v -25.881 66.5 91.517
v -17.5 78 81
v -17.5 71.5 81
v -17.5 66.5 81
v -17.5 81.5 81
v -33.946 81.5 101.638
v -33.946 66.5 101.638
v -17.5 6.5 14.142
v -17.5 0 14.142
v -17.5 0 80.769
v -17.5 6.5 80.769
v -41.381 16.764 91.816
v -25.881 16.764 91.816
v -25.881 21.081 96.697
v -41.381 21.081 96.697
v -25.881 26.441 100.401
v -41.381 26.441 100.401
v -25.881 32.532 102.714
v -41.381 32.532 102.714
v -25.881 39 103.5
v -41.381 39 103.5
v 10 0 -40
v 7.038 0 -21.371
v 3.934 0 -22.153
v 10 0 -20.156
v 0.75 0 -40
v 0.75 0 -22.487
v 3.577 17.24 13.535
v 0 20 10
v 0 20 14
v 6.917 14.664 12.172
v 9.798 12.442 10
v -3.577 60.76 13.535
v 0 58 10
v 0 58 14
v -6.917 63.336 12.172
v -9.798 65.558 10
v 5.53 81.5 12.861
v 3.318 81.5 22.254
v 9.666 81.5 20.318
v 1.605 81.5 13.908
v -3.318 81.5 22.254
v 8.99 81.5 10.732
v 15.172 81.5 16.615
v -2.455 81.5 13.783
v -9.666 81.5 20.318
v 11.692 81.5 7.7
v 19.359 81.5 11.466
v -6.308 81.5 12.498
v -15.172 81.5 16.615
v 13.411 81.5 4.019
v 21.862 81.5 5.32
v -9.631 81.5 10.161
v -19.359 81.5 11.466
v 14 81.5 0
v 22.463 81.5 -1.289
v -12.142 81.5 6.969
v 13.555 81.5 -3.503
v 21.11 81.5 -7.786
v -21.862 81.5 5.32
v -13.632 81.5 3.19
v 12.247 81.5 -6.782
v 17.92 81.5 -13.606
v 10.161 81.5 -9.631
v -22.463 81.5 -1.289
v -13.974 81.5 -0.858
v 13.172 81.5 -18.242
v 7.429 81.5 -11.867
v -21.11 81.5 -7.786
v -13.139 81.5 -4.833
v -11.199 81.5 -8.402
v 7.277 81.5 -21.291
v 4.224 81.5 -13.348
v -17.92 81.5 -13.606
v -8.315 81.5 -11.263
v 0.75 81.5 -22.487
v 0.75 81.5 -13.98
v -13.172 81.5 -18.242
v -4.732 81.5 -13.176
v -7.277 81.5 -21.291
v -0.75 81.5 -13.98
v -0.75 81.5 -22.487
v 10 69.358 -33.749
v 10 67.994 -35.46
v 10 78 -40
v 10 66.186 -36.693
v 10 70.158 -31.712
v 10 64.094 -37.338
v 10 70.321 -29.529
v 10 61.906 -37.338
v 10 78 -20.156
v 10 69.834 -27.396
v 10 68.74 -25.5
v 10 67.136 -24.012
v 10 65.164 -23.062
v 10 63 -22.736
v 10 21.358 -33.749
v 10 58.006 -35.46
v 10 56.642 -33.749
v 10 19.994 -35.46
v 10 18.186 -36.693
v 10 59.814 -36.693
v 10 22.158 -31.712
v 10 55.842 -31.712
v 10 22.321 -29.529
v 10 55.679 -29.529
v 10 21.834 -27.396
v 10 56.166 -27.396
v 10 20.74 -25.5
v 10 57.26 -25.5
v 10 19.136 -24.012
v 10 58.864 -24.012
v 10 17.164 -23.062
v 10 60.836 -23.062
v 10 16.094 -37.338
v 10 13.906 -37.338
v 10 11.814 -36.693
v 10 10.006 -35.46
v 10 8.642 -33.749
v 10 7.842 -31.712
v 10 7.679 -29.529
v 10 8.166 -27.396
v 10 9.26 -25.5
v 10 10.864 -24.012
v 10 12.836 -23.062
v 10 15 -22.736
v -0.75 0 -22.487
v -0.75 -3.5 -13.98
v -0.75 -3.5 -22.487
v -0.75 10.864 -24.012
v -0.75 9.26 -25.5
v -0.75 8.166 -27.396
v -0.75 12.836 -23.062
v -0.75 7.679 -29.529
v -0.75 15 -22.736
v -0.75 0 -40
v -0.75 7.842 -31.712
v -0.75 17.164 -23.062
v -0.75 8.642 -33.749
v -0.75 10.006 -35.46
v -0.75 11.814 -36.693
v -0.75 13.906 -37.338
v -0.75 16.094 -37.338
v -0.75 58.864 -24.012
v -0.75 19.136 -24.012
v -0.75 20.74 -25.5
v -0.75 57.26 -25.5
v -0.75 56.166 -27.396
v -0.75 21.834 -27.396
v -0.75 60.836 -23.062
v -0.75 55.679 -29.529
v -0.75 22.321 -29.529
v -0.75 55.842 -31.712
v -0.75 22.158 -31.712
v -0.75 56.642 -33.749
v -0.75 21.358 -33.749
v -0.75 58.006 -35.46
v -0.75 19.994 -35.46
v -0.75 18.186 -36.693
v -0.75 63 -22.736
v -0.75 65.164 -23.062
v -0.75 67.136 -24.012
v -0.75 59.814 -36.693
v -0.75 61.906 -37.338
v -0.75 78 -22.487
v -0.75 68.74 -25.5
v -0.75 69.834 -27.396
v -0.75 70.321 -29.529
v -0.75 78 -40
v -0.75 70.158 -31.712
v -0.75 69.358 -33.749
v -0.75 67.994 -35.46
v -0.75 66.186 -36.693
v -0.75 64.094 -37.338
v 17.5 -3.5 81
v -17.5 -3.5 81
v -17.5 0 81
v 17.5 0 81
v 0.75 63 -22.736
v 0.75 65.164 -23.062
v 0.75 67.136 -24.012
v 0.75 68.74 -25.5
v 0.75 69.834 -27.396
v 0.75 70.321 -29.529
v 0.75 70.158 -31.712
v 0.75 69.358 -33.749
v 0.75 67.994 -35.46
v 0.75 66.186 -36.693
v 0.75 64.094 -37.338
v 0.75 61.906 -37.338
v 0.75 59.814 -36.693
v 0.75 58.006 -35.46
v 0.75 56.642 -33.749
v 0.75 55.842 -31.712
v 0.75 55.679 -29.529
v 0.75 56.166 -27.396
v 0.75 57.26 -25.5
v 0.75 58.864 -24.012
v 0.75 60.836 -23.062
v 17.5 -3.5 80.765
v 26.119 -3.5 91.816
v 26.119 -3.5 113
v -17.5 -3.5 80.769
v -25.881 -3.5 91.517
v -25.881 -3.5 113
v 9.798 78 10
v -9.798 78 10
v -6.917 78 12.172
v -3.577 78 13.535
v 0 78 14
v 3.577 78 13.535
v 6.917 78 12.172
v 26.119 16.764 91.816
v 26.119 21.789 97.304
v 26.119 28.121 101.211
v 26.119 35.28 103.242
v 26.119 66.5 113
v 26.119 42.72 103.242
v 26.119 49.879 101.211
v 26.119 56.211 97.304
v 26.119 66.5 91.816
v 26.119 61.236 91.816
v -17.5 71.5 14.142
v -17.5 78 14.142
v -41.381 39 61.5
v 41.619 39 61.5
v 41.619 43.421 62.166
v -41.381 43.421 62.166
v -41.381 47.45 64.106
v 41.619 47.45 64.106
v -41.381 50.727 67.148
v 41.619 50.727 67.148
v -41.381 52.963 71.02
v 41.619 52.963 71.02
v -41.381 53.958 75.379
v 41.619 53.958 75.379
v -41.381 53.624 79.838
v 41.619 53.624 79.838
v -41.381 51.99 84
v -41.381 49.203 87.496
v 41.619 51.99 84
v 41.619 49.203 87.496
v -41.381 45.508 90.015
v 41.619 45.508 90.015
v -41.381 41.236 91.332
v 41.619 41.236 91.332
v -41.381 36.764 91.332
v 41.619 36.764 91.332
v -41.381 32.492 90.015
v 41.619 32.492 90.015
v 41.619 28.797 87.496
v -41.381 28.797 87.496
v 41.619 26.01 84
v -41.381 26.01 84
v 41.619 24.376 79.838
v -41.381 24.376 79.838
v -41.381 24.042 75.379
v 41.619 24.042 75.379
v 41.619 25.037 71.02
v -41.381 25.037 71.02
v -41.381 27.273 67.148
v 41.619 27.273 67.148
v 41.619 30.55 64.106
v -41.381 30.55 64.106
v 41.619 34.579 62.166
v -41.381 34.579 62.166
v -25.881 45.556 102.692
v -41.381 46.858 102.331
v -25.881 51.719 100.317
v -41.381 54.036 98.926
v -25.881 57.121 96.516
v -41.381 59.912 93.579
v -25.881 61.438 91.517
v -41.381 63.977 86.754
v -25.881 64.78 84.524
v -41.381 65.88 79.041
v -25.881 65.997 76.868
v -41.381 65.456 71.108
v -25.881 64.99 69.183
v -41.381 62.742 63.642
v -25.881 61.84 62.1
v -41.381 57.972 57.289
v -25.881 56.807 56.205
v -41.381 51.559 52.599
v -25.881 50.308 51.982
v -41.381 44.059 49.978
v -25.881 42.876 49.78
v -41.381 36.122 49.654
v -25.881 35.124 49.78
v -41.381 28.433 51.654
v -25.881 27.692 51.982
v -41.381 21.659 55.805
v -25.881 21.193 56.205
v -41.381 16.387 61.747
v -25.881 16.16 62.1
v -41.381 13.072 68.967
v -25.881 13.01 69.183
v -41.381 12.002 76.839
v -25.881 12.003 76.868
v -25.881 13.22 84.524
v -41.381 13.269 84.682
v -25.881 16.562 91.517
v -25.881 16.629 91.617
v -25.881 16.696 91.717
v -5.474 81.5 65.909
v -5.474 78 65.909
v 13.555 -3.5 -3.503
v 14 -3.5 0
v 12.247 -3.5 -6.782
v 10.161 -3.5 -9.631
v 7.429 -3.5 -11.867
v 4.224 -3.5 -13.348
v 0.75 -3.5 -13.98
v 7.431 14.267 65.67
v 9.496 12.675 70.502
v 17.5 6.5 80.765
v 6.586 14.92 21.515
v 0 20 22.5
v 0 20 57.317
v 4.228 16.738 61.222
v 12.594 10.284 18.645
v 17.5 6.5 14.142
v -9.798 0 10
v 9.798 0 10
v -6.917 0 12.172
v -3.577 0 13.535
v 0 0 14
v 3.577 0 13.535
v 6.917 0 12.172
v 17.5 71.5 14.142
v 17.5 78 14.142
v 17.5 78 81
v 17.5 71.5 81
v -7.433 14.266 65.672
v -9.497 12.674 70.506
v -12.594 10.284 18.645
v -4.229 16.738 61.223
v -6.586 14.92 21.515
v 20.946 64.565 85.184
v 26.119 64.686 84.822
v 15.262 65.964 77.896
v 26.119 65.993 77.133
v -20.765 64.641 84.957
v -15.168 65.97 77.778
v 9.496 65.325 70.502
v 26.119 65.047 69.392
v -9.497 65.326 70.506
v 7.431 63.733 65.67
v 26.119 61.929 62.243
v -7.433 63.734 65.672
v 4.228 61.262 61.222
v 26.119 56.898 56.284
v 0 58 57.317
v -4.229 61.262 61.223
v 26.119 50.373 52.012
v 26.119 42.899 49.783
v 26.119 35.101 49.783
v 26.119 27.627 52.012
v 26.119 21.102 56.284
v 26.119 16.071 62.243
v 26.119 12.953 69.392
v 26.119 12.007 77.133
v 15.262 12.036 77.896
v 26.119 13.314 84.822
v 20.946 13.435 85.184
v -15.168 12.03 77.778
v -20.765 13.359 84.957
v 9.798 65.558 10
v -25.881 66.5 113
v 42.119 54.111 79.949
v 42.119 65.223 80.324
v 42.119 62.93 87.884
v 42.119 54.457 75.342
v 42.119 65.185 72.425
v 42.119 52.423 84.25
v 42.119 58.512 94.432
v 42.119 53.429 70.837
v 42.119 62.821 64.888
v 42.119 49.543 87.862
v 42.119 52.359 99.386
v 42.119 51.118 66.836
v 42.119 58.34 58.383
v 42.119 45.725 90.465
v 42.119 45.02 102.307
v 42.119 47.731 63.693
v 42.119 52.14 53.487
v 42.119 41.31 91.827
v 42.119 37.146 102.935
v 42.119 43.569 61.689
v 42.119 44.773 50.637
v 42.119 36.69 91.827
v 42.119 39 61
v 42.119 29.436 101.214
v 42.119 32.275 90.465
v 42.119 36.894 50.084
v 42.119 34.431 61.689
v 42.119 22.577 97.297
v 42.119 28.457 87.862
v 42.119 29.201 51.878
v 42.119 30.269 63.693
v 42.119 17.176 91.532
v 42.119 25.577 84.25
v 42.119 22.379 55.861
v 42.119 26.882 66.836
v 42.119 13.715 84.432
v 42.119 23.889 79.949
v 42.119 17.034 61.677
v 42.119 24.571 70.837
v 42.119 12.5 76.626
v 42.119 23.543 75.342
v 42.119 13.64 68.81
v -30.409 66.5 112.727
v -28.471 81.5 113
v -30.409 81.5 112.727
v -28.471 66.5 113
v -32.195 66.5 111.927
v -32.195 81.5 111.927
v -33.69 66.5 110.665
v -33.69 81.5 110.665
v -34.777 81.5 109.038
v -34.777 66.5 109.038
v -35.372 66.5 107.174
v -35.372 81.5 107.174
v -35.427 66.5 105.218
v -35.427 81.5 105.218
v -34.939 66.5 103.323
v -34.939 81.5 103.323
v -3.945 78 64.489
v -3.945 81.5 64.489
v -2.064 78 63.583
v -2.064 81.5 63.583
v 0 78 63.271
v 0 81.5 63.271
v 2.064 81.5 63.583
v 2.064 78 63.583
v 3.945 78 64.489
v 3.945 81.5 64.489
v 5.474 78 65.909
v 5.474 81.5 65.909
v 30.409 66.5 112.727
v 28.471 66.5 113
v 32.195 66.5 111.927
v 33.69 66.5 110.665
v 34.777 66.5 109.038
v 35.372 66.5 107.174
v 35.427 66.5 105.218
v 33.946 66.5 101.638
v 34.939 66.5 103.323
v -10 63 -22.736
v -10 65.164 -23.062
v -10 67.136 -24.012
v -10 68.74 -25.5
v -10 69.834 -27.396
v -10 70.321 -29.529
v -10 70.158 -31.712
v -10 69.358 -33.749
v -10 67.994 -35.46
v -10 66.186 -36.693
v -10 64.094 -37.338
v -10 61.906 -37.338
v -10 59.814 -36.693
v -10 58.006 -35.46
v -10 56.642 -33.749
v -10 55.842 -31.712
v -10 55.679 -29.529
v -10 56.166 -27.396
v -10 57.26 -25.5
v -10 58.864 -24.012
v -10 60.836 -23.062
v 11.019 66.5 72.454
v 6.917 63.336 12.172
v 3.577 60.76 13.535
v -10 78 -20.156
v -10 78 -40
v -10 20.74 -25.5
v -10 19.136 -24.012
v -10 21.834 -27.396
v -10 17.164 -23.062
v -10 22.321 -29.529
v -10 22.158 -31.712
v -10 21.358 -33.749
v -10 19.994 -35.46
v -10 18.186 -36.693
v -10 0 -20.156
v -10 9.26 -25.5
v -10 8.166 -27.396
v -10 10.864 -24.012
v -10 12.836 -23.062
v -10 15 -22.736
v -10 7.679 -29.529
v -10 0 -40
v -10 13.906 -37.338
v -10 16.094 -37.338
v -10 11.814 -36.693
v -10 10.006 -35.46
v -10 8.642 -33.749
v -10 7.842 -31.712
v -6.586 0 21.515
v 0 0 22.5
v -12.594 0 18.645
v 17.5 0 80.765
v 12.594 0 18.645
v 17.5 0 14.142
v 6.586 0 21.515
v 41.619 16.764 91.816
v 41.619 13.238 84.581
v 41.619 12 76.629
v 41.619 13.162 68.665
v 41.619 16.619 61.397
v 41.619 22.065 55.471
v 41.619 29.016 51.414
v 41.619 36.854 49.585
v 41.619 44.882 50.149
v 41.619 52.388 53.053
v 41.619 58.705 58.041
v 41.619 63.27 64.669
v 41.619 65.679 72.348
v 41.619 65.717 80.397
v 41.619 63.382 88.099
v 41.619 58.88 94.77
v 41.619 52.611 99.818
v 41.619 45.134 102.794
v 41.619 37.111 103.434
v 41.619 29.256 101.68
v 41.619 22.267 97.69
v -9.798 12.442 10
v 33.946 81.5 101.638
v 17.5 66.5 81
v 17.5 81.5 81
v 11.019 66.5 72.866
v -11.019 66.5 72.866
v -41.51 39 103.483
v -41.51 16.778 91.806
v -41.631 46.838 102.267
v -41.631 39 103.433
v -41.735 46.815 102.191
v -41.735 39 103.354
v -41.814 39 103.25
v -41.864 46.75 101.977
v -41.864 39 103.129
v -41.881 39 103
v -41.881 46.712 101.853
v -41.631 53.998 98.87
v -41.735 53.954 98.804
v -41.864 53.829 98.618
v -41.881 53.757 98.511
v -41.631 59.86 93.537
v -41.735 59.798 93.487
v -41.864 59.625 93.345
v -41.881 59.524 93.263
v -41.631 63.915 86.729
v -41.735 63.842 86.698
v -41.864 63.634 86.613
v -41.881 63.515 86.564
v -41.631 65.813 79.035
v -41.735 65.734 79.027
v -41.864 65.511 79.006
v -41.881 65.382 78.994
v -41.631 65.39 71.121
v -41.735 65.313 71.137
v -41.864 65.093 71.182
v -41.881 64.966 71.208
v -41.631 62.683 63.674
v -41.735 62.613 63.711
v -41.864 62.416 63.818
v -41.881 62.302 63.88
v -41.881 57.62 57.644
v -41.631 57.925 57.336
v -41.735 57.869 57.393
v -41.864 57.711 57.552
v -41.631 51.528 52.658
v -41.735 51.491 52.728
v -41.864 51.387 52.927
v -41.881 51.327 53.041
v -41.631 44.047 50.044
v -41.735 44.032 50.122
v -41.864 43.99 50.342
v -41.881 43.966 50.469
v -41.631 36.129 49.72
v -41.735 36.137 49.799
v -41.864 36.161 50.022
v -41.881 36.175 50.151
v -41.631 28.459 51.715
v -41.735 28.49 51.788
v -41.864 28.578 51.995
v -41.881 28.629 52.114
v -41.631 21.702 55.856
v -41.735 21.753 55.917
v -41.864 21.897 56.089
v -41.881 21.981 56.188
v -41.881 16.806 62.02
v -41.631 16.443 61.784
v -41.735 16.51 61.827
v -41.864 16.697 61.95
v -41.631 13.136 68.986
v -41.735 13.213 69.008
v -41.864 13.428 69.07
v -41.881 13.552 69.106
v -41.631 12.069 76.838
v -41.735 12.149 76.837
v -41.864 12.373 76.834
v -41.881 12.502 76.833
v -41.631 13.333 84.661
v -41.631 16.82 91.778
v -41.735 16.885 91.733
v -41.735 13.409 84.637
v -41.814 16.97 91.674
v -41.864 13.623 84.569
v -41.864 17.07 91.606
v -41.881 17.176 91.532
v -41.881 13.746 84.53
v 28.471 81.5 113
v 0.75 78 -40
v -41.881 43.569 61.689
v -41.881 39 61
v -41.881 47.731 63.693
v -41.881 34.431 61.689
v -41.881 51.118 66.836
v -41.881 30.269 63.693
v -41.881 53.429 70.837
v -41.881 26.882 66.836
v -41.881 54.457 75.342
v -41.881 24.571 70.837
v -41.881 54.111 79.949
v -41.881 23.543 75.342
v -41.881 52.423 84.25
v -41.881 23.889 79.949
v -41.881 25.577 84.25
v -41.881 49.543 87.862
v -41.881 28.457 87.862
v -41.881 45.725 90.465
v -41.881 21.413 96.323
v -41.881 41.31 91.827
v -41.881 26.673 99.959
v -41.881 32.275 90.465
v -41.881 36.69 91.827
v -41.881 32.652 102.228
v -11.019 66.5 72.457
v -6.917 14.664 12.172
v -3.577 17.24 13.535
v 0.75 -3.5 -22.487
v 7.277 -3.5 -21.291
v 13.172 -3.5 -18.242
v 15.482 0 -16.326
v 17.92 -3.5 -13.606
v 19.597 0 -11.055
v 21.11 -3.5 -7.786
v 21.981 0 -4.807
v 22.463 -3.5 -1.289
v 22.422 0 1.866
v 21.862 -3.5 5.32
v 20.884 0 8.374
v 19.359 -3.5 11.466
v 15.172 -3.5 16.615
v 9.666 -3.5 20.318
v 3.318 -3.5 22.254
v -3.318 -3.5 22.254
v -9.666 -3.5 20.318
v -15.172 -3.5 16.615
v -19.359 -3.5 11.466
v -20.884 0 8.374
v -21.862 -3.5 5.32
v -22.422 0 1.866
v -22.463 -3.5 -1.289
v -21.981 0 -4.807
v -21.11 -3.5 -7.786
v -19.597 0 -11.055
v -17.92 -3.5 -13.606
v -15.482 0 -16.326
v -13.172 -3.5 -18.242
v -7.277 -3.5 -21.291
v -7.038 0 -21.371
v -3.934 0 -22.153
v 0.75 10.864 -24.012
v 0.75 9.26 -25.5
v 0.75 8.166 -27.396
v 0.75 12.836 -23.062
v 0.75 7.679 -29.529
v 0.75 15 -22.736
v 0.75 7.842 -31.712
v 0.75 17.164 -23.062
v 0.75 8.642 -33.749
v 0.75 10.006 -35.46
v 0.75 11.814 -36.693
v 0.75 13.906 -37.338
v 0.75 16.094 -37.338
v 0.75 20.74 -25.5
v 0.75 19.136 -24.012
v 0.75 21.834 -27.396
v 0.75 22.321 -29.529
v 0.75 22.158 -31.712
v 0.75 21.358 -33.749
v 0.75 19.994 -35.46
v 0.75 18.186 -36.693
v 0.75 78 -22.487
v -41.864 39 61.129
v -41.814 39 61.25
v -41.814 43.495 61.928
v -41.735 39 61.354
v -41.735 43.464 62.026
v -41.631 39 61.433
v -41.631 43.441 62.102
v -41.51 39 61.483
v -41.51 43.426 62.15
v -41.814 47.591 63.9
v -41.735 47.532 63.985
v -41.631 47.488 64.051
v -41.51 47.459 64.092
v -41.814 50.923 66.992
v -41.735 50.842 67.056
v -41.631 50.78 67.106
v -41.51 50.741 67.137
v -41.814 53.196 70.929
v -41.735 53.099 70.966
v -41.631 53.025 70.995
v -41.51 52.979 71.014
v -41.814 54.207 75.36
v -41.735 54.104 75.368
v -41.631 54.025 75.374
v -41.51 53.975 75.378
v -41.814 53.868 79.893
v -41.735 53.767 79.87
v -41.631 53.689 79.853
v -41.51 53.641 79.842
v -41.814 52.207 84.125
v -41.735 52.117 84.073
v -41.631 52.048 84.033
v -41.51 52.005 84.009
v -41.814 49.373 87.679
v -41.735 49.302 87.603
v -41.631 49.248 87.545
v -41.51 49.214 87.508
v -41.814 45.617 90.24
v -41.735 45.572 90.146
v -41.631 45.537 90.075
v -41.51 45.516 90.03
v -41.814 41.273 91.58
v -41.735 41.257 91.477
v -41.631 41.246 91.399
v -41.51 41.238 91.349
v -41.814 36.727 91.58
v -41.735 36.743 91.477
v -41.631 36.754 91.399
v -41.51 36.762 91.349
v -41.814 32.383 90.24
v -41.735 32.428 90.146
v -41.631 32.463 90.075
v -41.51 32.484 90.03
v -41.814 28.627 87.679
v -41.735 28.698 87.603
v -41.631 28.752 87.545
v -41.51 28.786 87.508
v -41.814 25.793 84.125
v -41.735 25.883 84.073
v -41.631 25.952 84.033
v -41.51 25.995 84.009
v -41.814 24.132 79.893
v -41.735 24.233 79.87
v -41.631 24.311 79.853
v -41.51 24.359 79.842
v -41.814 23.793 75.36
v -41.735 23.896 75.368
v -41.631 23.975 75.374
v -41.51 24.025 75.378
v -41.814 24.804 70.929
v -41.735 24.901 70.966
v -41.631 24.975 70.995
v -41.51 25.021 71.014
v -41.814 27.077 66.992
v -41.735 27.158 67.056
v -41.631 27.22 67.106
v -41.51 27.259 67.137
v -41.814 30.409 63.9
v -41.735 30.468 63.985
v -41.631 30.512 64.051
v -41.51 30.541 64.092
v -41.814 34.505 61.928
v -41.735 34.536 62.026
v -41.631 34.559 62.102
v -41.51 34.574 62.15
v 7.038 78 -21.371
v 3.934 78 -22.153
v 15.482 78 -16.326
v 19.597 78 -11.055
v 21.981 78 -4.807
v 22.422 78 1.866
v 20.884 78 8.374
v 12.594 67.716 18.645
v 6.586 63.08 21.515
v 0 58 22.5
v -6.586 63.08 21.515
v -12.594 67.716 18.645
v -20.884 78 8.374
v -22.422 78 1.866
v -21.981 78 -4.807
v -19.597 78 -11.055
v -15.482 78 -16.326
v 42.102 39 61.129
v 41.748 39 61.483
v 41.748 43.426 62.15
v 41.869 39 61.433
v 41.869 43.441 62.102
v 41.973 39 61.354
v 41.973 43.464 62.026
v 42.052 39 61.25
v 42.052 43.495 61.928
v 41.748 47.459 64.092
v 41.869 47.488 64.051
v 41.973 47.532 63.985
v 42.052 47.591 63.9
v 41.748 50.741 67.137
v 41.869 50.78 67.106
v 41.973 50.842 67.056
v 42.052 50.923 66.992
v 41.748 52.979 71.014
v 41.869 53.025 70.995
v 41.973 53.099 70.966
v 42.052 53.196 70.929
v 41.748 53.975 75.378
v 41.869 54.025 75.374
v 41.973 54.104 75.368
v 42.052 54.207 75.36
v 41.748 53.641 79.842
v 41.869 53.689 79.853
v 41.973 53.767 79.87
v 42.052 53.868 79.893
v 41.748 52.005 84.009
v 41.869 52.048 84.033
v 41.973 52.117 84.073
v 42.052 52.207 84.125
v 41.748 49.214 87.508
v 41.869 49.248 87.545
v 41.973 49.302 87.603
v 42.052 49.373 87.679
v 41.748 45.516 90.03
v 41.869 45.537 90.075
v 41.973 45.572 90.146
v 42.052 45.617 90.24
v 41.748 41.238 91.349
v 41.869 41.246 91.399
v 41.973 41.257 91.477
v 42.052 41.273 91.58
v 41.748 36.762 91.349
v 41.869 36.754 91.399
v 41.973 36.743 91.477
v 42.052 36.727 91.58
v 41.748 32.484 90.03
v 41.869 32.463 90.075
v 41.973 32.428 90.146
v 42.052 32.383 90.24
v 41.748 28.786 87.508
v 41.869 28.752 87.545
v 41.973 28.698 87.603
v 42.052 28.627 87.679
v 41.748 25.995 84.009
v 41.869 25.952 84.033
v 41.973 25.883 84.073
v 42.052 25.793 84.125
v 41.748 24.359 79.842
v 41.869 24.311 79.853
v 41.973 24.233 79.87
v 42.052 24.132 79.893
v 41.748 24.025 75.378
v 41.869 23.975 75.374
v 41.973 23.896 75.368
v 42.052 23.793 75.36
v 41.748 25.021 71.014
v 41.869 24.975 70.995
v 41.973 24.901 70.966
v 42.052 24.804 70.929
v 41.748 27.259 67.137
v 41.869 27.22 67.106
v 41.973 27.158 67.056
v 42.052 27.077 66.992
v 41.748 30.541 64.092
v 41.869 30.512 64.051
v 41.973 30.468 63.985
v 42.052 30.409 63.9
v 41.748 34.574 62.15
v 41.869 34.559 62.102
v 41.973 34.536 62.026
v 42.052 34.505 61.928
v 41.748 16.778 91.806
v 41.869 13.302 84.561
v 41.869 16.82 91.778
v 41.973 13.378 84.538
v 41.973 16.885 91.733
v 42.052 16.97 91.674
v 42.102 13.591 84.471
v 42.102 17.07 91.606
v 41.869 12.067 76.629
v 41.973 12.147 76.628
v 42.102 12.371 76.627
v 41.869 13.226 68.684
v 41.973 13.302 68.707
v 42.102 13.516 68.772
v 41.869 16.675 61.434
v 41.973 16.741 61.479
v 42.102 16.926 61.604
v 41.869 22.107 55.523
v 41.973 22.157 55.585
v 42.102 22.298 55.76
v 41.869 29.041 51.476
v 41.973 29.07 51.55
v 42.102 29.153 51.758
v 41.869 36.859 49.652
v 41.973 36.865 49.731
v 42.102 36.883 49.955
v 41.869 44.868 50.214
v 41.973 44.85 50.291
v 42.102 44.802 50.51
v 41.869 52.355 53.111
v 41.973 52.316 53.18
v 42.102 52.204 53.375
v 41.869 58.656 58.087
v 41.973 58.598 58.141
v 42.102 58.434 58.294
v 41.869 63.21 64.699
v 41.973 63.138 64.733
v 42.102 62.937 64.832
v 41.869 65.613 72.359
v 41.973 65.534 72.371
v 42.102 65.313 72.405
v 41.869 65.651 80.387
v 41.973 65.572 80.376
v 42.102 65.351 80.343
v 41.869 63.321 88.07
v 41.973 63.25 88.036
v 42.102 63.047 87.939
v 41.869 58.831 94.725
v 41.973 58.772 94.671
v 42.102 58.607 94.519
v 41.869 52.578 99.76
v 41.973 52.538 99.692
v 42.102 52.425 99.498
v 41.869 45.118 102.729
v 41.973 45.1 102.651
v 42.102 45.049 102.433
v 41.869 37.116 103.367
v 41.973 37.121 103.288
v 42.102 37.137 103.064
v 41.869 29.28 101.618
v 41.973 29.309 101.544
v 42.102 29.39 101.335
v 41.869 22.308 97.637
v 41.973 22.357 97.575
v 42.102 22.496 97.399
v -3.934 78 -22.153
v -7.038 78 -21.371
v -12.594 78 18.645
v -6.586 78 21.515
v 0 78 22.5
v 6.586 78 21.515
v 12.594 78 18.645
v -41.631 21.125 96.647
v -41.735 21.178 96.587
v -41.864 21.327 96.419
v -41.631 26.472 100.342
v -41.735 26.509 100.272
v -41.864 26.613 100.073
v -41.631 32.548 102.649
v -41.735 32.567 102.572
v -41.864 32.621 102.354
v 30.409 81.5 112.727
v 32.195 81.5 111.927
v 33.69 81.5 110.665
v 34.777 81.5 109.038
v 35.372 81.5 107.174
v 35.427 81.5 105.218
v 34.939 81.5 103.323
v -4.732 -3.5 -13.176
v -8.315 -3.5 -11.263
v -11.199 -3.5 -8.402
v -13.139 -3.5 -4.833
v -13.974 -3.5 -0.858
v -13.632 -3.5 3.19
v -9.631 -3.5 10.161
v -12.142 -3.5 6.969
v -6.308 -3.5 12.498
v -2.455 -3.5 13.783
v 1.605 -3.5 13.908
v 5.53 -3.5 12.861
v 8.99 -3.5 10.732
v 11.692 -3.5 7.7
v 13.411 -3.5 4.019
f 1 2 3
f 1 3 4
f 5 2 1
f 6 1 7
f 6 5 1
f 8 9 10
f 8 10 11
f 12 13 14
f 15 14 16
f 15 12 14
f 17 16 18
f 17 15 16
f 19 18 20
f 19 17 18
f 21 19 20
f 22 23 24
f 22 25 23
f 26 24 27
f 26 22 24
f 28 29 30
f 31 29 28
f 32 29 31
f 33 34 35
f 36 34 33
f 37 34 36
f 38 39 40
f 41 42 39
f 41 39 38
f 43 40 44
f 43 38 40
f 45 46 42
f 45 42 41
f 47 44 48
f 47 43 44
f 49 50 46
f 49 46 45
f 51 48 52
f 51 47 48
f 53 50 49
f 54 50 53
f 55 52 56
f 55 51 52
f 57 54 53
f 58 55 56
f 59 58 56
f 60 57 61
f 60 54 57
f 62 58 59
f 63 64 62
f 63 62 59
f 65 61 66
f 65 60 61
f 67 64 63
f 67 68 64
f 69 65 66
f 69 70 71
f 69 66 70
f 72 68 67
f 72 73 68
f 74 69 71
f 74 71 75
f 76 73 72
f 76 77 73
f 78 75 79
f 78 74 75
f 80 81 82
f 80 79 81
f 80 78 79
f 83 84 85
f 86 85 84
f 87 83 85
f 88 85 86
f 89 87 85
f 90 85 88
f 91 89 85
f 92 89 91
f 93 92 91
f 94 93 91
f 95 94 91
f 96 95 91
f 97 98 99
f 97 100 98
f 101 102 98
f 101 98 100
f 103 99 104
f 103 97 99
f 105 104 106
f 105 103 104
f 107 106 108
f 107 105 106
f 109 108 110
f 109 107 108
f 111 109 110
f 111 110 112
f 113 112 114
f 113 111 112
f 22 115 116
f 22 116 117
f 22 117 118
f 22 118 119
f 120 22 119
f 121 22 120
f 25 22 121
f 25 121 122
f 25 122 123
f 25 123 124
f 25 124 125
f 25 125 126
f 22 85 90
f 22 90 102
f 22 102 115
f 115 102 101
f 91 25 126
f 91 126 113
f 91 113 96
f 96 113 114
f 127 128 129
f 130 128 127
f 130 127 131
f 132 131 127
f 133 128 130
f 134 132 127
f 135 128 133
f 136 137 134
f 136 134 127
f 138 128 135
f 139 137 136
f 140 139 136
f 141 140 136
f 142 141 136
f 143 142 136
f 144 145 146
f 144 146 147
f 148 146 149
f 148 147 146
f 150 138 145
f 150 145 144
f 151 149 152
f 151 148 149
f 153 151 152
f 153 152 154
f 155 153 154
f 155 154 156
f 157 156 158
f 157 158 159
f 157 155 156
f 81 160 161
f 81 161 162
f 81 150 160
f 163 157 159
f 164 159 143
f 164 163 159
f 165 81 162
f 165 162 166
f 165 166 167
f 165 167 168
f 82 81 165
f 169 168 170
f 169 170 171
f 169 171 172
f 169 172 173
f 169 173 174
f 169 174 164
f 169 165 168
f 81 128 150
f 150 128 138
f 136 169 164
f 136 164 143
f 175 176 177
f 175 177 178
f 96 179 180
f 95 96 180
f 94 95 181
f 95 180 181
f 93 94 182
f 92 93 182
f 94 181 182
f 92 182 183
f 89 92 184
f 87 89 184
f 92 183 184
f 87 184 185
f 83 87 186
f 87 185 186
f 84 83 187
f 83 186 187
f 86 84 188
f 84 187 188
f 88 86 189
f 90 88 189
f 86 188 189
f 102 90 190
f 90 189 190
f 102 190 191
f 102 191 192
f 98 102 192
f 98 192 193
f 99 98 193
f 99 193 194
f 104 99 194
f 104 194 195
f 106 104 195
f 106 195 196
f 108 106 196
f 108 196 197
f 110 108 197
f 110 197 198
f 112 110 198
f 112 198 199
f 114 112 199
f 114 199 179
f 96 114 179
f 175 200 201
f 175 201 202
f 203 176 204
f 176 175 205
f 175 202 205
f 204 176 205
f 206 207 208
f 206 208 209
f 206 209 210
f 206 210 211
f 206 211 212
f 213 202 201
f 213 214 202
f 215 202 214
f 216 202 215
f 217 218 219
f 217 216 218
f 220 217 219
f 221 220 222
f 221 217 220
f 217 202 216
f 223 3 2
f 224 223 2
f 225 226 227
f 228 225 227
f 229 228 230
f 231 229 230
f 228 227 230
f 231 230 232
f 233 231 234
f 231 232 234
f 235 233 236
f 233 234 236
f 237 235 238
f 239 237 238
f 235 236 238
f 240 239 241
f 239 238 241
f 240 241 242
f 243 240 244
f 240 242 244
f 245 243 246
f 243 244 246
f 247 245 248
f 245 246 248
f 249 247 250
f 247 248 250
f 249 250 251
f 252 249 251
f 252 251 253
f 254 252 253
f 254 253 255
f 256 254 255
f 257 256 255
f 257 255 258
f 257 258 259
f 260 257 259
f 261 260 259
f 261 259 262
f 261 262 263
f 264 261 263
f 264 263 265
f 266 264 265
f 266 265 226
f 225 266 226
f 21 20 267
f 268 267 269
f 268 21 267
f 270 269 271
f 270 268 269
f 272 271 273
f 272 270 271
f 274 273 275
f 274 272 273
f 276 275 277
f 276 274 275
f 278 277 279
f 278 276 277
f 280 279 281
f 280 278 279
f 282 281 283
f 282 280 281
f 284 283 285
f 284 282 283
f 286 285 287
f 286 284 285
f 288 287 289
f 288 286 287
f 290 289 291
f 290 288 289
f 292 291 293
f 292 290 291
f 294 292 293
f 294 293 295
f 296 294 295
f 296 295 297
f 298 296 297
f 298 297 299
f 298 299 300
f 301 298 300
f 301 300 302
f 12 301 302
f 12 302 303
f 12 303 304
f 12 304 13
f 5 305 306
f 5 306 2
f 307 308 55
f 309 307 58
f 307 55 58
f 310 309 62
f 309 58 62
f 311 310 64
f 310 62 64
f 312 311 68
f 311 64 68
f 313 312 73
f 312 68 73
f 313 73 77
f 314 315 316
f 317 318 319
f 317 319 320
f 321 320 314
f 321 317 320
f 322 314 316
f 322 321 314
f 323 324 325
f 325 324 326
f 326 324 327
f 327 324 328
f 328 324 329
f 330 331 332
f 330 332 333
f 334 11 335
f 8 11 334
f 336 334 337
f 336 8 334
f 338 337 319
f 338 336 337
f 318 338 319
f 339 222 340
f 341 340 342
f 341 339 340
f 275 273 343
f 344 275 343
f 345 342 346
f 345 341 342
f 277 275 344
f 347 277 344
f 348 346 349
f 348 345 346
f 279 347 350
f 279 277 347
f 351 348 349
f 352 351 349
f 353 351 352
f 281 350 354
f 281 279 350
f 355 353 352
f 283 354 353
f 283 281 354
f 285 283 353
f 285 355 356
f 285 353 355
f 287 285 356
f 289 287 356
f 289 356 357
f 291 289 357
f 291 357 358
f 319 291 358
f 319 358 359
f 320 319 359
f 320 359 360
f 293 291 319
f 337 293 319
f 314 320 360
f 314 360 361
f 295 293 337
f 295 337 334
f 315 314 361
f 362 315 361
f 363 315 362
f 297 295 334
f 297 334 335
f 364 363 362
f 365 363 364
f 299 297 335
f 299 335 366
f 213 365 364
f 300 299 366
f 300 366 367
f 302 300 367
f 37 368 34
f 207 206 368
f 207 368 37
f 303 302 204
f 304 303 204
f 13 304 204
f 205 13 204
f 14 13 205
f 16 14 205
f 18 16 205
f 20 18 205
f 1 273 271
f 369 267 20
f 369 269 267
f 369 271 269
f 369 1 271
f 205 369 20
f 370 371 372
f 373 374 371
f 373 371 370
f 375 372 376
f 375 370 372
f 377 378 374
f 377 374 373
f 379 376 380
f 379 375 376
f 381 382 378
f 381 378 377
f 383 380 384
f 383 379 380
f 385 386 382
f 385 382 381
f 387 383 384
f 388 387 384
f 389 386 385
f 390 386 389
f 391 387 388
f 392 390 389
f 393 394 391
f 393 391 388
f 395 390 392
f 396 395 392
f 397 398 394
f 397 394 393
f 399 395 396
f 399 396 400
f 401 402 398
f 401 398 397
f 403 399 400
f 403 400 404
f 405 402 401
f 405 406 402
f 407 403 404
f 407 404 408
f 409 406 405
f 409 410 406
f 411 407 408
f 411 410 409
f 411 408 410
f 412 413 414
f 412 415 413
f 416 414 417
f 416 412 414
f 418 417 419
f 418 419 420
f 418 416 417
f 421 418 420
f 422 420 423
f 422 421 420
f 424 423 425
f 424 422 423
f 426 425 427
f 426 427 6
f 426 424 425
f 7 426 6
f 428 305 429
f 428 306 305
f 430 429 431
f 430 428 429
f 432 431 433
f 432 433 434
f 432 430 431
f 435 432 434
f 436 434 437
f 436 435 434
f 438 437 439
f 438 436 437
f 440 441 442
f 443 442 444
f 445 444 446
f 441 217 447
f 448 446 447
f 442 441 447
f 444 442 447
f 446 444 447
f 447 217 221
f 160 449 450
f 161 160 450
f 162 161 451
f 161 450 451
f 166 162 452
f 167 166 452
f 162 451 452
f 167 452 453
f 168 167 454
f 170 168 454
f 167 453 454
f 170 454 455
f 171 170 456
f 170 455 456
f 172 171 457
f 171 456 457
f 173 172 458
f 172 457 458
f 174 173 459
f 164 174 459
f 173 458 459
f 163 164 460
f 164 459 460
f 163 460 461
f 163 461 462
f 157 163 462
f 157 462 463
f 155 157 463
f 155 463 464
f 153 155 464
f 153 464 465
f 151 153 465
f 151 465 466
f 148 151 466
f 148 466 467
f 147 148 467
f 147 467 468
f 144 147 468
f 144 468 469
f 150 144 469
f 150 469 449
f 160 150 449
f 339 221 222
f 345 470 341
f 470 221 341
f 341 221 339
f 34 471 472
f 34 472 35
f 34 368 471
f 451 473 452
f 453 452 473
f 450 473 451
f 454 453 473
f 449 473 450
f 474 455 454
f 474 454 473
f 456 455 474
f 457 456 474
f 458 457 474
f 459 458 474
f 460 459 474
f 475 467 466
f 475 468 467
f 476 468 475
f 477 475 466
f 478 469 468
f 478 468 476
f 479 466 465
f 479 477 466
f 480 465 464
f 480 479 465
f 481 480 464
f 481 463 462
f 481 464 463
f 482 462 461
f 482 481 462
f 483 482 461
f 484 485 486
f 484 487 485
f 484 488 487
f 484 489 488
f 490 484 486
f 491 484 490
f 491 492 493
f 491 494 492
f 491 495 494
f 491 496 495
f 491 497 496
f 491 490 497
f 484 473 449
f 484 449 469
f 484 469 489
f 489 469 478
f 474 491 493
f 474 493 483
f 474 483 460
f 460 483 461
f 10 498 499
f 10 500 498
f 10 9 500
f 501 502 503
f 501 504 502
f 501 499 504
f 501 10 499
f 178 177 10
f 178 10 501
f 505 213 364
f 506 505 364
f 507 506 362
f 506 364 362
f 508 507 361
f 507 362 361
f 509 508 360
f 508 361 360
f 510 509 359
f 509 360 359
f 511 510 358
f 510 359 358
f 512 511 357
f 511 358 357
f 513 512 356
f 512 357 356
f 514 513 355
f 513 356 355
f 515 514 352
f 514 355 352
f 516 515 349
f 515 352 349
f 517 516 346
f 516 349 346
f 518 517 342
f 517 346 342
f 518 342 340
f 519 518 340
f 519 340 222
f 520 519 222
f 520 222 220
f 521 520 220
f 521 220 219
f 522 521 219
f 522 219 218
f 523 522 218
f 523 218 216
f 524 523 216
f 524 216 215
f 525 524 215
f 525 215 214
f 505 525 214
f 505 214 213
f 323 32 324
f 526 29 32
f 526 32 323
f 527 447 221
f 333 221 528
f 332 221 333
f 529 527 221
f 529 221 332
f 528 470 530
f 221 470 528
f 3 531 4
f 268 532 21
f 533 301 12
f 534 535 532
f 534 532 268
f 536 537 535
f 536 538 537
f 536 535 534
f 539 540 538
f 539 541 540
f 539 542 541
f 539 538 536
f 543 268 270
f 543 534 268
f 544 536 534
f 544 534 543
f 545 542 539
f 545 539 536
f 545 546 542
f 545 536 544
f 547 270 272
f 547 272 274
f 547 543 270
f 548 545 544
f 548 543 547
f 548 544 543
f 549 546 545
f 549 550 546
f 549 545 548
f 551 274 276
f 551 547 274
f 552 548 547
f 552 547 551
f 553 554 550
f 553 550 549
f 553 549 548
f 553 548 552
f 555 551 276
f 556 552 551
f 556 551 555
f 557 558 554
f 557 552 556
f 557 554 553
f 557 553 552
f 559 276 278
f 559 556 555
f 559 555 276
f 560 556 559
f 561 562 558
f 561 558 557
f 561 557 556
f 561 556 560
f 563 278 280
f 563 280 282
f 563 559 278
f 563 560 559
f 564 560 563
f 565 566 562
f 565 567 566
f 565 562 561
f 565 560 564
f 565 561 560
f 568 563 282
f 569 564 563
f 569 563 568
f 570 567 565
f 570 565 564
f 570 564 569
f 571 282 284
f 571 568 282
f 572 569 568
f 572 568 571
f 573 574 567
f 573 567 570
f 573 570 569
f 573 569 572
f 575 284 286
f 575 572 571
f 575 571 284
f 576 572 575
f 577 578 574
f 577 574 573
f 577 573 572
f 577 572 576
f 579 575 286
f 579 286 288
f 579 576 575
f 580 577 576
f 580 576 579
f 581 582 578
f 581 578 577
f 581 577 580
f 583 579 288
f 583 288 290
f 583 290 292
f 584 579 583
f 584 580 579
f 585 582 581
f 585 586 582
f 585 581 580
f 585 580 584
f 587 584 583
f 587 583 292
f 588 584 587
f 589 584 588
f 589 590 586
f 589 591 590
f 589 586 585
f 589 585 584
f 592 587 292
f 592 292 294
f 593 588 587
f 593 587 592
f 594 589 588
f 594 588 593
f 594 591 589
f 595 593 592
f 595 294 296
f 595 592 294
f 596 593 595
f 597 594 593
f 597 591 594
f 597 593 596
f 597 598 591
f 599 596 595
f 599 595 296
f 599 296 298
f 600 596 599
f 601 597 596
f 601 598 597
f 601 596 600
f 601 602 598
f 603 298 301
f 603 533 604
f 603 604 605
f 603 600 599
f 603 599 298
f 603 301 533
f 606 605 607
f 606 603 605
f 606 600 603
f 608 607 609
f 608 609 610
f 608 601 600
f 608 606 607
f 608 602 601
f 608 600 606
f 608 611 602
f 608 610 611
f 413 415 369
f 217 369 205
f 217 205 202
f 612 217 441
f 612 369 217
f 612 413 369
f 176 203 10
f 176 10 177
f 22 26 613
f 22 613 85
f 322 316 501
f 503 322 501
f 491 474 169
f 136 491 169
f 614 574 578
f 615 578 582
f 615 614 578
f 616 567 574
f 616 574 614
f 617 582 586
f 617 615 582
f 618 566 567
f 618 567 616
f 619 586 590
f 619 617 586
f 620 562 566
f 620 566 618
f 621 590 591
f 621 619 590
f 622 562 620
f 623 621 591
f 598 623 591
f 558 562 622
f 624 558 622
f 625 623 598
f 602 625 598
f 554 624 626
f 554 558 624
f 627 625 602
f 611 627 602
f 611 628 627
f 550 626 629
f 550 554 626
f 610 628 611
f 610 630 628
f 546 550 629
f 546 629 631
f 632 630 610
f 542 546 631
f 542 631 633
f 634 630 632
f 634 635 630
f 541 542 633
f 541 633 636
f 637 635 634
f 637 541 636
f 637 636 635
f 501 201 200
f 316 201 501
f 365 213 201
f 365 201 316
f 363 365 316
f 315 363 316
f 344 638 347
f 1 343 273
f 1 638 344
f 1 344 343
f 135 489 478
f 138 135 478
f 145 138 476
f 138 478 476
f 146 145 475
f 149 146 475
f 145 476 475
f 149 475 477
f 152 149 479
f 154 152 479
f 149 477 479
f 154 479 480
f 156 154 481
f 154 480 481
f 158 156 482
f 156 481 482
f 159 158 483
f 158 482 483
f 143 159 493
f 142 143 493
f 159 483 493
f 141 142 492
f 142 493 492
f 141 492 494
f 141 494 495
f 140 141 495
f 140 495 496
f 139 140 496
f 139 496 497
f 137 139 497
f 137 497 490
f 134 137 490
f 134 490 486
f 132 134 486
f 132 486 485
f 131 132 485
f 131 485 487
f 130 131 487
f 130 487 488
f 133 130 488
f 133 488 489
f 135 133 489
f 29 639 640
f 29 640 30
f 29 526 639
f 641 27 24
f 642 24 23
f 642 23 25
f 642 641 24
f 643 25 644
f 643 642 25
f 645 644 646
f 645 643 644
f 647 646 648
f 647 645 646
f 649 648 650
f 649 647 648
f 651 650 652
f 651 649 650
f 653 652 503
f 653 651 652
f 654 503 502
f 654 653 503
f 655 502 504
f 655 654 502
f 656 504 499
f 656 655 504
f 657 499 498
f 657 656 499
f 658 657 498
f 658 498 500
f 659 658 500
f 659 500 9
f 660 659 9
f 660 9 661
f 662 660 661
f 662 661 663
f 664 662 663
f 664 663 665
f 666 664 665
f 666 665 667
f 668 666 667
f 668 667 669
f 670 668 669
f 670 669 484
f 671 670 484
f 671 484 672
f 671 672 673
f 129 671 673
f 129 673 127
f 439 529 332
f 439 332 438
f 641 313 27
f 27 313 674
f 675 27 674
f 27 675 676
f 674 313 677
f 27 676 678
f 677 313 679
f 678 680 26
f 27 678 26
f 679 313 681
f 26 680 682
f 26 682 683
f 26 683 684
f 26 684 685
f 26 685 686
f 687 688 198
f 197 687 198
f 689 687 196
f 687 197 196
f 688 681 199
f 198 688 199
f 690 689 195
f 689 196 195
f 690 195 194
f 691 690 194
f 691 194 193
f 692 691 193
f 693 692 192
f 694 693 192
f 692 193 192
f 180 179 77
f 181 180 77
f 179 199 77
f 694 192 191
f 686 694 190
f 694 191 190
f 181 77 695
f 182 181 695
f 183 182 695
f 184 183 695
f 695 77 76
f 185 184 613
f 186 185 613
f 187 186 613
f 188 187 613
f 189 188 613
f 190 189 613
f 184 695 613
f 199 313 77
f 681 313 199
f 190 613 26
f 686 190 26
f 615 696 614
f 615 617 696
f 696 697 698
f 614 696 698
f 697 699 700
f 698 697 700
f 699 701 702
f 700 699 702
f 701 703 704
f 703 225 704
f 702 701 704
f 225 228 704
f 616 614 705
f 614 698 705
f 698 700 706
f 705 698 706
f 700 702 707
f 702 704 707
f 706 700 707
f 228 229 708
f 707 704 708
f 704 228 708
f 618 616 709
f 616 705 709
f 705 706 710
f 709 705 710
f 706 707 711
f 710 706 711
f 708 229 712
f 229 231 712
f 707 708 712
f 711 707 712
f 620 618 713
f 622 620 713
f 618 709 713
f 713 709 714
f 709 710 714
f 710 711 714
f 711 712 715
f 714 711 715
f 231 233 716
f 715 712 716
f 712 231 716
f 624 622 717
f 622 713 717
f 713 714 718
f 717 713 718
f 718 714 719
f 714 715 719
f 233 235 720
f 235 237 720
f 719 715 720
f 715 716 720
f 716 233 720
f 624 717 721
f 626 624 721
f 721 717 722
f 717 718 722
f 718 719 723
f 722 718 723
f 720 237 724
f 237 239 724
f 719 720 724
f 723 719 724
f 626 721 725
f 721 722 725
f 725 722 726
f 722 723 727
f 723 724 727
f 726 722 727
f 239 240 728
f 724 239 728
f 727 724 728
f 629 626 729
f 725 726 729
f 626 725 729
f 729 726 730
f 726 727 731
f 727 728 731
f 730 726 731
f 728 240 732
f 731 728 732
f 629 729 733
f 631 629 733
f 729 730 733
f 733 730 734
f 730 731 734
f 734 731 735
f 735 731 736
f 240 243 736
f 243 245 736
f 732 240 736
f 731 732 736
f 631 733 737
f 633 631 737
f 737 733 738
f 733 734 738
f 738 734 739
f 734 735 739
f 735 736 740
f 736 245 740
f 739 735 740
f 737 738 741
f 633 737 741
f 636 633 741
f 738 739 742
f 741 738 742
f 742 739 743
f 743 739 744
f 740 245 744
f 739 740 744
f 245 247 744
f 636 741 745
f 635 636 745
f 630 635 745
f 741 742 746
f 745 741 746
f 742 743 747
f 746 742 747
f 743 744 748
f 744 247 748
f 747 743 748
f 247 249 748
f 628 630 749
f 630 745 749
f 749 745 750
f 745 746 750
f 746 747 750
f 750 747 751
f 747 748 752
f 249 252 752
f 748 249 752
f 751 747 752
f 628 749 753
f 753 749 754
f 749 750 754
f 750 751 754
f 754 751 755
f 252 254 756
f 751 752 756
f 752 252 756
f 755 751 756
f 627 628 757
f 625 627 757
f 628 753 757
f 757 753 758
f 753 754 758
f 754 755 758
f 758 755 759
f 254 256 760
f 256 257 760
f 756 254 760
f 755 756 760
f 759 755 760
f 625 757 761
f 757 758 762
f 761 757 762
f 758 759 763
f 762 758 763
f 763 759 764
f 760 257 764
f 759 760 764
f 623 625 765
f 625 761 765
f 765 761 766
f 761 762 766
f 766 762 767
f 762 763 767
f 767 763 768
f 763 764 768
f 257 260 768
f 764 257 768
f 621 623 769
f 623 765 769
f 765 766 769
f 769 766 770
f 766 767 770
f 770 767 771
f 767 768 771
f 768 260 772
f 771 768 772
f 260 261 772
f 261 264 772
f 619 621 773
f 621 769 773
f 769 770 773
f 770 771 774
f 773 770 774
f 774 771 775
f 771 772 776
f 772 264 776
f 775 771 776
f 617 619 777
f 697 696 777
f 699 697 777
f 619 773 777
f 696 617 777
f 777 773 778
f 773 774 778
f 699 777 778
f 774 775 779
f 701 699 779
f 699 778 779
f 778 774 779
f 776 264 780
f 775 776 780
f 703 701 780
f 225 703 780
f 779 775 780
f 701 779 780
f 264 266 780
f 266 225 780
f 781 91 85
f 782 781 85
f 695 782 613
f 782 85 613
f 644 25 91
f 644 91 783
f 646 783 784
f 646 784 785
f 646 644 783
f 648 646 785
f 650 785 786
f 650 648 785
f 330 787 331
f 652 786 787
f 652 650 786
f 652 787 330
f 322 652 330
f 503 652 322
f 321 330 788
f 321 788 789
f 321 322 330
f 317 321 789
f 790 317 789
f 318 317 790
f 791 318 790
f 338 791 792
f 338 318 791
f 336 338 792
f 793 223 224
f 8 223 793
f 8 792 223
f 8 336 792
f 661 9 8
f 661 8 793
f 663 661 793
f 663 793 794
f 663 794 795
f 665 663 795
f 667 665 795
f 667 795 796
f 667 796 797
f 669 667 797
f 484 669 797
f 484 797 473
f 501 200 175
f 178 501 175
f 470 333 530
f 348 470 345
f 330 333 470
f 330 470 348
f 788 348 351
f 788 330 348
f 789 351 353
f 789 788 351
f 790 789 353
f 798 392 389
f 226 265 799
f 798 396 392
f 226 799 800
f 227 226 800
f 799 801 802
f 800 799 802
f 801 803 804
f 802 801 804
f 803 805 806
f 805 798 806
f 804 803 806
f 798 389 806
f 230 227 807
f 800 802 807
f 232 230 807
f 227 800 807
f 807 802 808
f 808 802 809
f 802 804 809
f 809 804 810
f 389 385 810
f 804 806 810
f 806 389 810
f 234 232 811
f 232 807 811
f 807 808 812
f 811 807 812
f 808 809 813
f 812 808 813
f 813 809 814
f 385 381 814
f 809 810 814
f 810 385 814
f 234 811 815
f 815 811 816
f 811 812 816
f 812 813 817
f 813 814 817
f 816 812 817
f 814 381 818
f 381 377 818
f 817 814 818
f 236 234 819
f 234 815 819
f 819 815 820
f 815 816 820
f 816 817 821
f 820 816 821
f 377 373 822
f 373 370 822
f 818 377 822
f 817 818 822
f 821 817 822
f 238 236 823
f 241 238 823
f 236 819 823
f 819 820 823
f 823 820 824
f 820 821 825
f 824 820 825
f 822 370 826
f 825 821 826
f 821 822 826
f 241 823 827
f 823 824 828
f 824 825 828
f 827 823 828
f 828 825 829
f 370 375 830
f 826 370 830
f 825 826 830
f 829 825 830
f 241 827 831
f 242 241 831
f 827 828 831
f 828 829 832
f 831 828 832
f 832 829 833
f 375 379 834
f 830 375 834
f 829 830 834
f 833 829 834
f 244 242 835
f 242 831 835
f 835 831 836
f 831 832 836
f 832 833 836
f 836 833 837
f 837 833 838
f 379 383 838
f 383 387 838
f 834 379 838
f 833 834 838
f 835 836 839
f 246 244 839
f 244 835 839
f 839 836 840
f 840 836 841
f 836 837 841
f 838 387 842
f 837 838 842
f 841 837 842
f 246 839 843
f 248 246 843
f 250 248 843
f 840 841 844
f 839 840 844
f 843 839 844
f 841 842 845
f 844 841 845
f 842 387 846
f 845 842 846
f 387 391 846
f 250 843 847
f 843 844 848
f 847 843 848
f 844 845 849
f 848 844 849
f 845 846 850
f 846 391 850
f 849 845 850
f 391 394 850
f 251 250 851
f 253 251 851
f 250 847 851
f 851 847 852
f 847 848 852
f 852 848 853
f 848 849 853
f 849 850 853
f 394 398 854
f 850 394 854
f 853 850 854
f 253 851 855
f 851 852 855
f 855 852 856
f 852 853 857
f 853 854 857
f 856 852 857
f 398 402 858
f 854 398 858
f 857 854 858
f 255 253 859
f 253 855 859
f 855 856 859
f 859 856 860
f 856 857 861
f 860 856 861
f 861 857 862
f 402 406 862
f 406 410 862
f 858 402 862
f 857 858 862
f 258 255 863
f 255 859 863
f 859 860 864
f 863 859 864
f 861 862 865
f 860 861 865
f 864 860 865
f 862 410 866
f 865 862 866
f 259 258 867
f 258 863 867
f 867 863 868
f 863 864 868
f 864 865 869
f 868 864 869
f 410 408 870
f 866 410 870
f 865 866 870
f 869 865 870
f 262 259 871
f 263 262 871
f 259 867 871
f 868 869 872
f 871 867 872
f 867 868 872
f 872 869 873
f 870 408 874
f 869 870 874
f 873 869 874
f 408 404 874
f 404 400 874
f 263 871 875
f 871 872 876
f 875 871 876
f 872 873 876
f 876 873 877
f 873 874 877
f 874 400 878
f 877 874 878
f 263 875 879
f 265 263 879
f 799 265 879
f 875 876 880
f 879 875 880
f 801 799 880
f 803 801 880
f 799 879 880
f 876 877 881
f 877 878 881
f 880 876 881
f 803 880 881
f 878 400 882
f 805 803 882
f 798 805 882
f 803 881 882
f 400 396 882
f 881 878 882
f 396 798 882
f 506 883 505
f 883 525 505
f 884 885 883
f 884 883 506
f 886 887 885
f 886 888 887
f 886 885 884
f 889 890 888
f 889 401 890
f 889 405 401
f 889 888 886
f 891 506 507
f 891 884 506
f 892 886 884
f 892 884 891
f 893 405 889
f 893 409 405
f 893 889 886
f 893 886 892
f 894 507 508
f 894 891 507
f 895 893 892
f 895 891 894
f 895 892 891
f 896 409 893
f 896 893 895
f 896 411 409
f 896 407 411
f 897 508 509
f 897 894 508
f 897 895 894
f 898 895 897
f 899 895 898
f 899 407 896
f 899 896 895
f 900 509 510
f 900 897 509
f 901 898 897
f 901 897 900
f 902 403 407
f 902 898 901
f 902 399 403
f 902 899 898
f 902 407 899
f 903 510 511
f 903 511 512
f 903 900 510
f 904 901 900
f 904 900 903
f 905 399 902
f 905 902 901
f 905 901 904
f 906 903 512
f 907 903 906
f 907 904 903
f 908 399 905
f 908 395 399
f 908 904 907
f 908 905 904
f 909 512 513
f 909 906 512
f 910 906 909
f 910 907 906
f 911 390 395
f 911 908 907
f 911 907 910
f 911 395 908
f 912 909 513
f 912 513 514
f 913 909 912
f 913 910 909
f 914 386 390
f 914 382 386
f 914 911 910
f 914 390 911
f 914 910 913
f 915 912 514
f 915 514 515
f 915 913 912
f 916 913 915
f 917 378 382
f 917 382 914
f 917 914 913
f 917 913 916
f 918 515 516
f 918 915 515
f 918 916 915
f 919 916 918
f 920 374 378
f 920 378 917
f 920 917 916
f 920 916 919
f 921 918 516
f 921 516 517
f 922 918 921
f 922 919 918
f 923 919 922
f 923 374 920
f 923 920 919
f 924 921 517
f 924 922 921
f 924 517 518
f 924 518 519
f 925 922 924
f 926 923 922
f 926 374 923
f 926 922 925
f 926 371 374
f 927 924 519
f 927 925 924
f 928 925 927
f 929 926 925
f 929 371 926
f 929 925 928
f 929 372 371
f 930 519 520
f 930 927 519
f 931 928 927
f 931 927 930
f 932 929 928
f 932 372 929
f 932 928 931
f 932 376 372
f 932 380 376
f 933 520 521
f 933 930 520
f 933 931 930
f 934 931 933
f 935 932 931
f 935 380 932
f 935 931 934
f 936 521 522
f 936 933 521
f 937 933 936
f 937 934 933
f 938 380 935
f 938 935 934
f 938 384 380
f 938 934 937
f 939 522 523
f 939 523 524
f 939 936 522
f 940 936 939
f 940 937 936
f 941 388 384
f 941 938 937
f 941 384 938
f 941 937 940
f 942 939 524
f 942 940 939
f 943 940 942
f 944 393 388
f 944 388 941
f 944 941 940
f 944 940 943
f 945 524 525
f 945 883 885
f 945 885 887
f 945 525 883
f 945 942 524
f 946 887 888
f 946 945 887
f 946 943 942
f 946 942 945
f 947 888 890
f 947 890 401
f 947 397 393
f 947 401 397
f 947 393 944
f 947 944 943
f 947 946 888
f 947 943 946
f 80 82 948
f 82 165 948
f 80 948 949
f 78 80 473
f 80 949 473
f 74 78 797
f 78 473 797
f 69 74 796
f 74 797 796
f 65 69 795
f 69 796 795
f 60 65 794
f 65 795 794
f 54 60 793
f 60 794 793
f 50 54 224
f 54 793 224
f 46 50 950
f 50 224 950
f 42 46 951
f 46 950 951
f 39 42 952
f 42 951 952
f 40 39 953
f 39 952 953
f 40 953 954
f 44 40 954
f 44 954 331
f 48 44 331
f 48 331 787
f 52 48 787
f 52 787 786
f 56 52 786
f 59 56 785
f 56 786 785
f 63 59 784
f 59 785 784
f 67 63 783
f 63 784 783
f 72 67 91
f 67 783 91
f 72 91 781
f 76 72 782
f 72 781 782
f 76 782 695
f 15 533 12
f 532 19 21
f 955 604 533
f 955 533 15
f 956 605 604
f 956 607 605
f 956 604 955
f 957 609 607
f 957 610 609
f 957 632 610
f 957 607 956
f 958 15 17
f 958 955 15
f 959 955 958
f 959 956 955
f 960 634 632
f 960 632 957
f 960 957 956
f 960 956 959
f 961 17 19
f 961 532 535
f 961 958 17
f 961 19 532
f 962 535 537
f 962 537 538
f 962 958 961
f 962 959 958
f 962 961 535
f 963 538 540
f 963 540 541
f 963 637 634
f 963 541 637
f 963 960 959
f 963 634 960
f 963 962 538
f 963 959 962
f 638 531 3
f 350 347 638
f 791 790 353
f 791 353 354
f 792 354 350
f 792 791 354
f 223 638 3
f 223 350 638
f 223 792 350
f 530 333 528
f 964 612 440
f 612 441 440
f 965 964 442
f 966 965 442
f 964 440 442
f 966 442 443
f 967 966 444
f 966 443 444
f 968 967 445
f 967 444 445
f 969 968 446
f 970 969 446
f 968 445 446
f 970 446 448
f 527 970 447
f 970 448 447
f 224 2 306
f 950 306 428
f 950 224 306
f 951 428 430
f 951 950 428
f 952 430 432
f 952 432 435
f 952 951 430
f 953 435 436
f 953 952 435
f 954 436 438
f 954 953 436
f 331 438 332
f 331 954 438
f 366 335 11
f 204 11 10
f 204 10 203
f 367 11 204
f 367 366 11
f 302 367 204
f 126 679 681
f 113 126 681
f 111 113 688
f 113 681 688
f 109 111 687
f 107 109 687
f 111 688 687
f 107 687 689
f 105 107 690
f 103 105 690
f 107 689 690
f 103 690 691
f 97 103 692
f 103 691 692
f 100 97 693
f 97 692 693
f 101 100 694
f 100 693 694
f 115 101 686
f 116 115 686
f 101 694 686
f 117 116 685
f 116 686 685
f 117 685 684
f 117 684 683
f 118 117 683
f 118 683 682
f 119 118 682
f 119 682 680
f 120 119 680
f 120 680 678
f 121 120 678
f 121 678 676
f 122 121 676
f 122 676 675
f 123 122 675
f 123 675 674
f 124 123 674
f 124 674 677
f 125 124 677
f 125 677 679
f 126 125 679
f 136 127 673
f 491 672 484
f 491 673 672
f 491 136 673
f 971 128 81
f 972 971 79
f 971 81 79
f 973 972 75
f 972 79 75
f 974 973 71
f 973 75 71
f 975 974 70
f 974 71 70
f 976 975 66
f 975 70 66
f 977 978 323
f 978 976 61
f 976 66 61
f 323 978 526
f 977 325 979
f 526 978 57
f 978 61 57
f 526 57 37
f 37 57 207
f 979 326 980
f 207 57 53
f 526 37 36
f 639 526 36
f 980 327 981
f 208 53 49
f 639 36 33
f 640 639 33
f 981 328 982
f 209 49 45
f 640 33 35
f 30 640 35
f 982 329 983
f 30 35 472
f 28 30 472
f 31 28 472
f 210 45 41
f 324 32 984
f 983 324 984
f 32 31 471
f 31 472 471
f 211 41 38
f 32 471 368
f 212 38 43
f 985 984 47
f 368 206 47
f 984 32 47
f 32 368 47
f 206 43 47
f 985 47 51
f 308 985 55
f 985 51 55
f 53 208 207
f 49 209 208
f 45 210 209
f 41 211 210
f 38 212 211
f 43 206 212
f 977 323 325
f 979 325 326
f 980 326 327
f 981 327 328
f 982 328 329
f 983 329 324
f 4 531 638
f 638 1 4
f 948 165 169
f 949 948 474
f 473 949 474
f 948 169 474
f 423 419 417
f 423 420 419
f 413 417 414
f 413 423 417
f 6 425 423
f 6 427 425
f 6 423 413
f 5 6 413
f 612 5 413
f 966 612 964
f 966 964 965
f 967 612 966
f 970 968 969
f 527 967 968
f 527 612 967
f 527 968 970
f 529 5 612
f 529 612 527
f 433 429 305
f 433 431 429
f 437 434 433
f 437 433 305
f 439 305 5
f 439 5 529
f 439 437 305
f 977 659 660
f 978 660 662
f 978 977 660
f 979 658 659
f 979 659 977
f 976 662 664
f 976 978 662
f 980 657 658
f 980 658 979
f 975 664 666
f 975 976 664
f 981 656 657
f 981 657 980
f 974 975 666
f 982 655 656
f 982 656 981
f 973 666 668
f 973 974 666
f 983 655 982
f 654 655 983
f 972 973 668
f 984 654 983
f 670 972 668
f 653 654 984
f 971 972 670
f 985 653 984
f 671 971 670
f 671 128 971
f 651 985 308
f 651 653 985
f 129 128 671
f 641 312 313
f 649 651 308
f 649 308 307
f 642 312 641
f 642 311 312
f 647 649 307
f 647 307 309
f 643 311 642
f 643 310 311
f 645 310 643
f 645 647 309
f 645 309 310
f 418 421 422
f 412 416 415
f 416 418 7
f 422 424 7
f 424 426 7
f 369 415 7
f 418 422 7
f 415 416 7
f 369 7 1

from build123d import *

# Parameters (mm, degrees)
EXTRUDE_1_DEPTH            = 78
SKETCH_3_R                 = 22.5
EXTRUDE_2_DEPTH            = 3.5
EXTRUDE_START              = 3.5
SKETCH_4_R                 = 22.5
EXTRUDE_3_DEPTH            = 3.5
SKETCH_5_W                 = 1.5
SKETCH_5_H                 = 36.764720589
CUT_EXTRUDE_1_DEPTH        = 97.598395432
SKETCH_6_R                 = 14
CUT_EXTRUDE_2_DEPTH        = 97.598395432
EXTRUDE_4_DEPTH            = 71
EXTRUDE_5_DEPTH            = 15
FILLET_1_R                 = 7
EXTRUDE_6_DEPTH            = 70
SKETCH_10_W                = 35
SKETCH_10_H                = 23.870791075
CUT_EXTRUDE_3_DEPTH        = 3.5
SKETCH_11_R                = 27
EXTRUDE_7_DEPTH            = 16
EXTRUDE_START_2            = 16
SKETCH_12_R                = 27
EXTRUDE_8_DEPTH            = 16
EXTRUDE_START_3            = 68
SKETCH_13_R                = 27
EXTRUDE_9_DEPTH            = 68
SKETCH_16_R                = 15
CUT_EXTRUDE_4_DEPTH        = 163.687584038
FILLET_2_R                 = 0.5
HOLE_WIZARD_5_8_18_1_D     = 14.68374
HOLE_WIZARD_5_8_18_1_DEPTH = 38.7985
HOLE_WIZARD_5_8_18_1_TIP   = 4.411440553


with BuildPart() as part:
    # 草图1 → 拉伸1 (new body)
    with BuildSketch(Plane(origin=(0, 0, 0), x_dir=(1, 0, 0), z_dir=(0, 1, 0))):
        with BuildLine():
            Line((-10, 20.155644371), (-10, 40))
            Line((-10, 40), (10, 40))
            Line((10, 40), (10, 20.155644371))
            ThreePointArc((10, 20.155644371), (0, -22.5), (-10, 20.155644371))
        make_face()
    extrude(amount=EXTRUDE_1_DEPTH)

    # 草图3 → 拉伸2 (add)
    with BuildSketch(Plane(origin=(0, 78, 0), x_dir=(1, 0, 0), z_dir=(0, 1, 0))):
        with Locations(Location((0, 0, 0), (0, 0, 63.612200039))):
            Circle(SKETCH_3_R)
    extrude(amount=EXTRUDE_2_DEPTH)

    # 草图4 → 拉伸3 (add)
    with BuildSketch(Plane.XZ.offset(EXTRUDE_START)):
        with Locations(Location((0, 0, 0), (0, 0, 270))):
            Circle(SKETCH_4_R)
    extrude(amount=-EXTRUDE_3_DEPTH)

    # 草图5 → 切除-拉伸1 (cut, through all)
    with BuildSketch(Plane(origin=(0, 81.5, 0), x_dir=(1, 0, 0), z_dir=(0, 1, 0))):
        with Locations((0, 23.144665006)):
            Rectangle(SKETCH_5_W, SKETCH_5_H)
    extrude(amount=-CUT_EXTRUDE_1_DEPTH, mode=Mode.SUBTRACT)

    # 草图6 → 切除-拉伸2 (cut, through all)
    with BuildSketch(Plane(origin=(0, 81.5, 0), x_dir=(1, 0, 0), z_dir=(0, 1, 0))):
        Circle(SKETCH_6_R)
    extrude(amount=-CUT_EXTRUDE_2_DEPTH, mode=Mode.SUBTRACT)

    # 草图7 → 拉伸4 (add)
    with BuildSketch(Plane.XY.offset(10)):
        Polygon((-17.5, 78), (17.5, 78), (17.5, 71.5), (0, 58), (-17.5, 71.5), align=None)
        Polygon((-17.5, 6.5), (0, 20), (17.5, 6.5), (17.5, 0), (-17.5, 0), align=None)
    extrude(amount=EXTRUDE_4_DEPTH)

    # 草图8 → 拉伸5 (add)
    with BuildSketch(Plane(origin=(0, 81.5, 0), x_dir=(1, 0, 0), z_dir=(0, 1, 0))):
        Polygon((-43, -113), (43, -113), (17.5, -81), (0, -59.039215686), (-17.5, -81), align=None)
    extrude(amount=-EXTRUDE_5_DEPTH)

    # 圆角1
    fillet_1_edges = [part.edges().sort_by_distance(p)[0] for p in [
        (-43, 74, 113),
        (0, 79.75, 59.039215686),
        (43, 74, 113),
    ]]
    fillet(fillet_1_edges, radius=FILLET_1_R)

    # 草图9 → 拉伸6 (add)
    with BuildSketch(Plane.XZ.offset(-66.5)):
        Polygon((-25.881035827, 113), (26.118964173, 113), (26.118964173, 91.81595504), (0, 58.326677723), (-25.881035827, 91.517378293), align=None)
    extrude(amount=EXTRUDE_6_DEPTH)

    # 草图10 → 切除-拉伸3 (cut)
    with BuildSketch(Plane.XZ.offset(3.5)):
        with Locations((0, 69.064604463)):
            Rectangle(SKETCH_10_W, SKETCH_10_H)
    extrude(amount=-CUT_EXTRUDE_3_DEPTH, mode=Mode.SUBTRACT)

    # 草图11 → 拉伸7 (add)
    with BuildSketch(Plane(origin=(26.118964173, 0, 0), x_dir=(0, 0, -1), z_dir=(1, 0, 0))):
        with Locations(Location((-76.5, 39, 0), (0, 0, 235.440790003))):
            Circle(SKETCH_11_R)
    extrude(amount=EXTRUDE_7_DEPTH)

    # 草图12 → 拉伸8 (add)
    with BuildSketch(Plane.ZY.offset(25.881035827).offset(EXTRUDE_START_2)):
        with Locations(Location((76.5, 39, 0), (0, 0, 304.559209997))):
            Circle(SKETCH_12_R)
    extrude(amount=-EXTRUDE_8_DEPTH)

    # 草图13 → 拉伸9 (add)
    with BuildSketch(Plane.ZY.offset(-26.118964173).offset(EXTRUDE_START_3)):
        with Locations((76.5, 39)):
            Circle(SKETCH_13_R)
    extrude(amount=-EXTRUDE_9_DEPTH)

    # 草图16 → 切除-拉伸4 (cut, through all)
    with BuildSketch(Plane(origin=(42.118964173, 0, 0), x_dir=(0, 0, -1), z_dir=(1, 0, 0))):
        with Locations((-76.5, 39)):
            Circle(SKETCH_16_R)
    extrude(amount=-CUT_EXTRUDE_4_DEPTH, mode=Mode.SUBTRACT)

    # 圆角2
    fillet_2_edges = [part.edges().sort_by_distance(p)[0] for p in [
        (42.118964173, 61.235591317, 61.18404496),
        (-41.881035827, 51.559243885, 52.598841178),
        (-41.881035827, 39, 91.5),
        (42.118964173, 39, 91.5),
    ]]
    fillet(fillet_2_edges, radius=FILLET_2_R)

    # 5/8-18 螺纹孔1
    with Locations(Plane(origin=(10, 0, 0), x_dir=(0, 0, -1), z_dir=(1, 0, 0))):
        with Locations((30.077822185, 63), (30.077822185, 15)):
            Hole(HOLE_WIZARD_5_8_18_1_D / 2, depth=HOLE_WIZARD_5_8_18_1_DEPTH)
            with Locations((0, 0, -(HOLE_WIZARD_5_8_18_1_DEPTH + HOLE_WIZARD_5_8_18_1_TIP / 2))):  # 118° drill point
                Cone(0, HOLE_WIZARD_5_8_18_1_D / 2, HOLE_WIZARD_5_8_18_1_TIP, mode=Mode.SUBTRACT)


solid = part.part
